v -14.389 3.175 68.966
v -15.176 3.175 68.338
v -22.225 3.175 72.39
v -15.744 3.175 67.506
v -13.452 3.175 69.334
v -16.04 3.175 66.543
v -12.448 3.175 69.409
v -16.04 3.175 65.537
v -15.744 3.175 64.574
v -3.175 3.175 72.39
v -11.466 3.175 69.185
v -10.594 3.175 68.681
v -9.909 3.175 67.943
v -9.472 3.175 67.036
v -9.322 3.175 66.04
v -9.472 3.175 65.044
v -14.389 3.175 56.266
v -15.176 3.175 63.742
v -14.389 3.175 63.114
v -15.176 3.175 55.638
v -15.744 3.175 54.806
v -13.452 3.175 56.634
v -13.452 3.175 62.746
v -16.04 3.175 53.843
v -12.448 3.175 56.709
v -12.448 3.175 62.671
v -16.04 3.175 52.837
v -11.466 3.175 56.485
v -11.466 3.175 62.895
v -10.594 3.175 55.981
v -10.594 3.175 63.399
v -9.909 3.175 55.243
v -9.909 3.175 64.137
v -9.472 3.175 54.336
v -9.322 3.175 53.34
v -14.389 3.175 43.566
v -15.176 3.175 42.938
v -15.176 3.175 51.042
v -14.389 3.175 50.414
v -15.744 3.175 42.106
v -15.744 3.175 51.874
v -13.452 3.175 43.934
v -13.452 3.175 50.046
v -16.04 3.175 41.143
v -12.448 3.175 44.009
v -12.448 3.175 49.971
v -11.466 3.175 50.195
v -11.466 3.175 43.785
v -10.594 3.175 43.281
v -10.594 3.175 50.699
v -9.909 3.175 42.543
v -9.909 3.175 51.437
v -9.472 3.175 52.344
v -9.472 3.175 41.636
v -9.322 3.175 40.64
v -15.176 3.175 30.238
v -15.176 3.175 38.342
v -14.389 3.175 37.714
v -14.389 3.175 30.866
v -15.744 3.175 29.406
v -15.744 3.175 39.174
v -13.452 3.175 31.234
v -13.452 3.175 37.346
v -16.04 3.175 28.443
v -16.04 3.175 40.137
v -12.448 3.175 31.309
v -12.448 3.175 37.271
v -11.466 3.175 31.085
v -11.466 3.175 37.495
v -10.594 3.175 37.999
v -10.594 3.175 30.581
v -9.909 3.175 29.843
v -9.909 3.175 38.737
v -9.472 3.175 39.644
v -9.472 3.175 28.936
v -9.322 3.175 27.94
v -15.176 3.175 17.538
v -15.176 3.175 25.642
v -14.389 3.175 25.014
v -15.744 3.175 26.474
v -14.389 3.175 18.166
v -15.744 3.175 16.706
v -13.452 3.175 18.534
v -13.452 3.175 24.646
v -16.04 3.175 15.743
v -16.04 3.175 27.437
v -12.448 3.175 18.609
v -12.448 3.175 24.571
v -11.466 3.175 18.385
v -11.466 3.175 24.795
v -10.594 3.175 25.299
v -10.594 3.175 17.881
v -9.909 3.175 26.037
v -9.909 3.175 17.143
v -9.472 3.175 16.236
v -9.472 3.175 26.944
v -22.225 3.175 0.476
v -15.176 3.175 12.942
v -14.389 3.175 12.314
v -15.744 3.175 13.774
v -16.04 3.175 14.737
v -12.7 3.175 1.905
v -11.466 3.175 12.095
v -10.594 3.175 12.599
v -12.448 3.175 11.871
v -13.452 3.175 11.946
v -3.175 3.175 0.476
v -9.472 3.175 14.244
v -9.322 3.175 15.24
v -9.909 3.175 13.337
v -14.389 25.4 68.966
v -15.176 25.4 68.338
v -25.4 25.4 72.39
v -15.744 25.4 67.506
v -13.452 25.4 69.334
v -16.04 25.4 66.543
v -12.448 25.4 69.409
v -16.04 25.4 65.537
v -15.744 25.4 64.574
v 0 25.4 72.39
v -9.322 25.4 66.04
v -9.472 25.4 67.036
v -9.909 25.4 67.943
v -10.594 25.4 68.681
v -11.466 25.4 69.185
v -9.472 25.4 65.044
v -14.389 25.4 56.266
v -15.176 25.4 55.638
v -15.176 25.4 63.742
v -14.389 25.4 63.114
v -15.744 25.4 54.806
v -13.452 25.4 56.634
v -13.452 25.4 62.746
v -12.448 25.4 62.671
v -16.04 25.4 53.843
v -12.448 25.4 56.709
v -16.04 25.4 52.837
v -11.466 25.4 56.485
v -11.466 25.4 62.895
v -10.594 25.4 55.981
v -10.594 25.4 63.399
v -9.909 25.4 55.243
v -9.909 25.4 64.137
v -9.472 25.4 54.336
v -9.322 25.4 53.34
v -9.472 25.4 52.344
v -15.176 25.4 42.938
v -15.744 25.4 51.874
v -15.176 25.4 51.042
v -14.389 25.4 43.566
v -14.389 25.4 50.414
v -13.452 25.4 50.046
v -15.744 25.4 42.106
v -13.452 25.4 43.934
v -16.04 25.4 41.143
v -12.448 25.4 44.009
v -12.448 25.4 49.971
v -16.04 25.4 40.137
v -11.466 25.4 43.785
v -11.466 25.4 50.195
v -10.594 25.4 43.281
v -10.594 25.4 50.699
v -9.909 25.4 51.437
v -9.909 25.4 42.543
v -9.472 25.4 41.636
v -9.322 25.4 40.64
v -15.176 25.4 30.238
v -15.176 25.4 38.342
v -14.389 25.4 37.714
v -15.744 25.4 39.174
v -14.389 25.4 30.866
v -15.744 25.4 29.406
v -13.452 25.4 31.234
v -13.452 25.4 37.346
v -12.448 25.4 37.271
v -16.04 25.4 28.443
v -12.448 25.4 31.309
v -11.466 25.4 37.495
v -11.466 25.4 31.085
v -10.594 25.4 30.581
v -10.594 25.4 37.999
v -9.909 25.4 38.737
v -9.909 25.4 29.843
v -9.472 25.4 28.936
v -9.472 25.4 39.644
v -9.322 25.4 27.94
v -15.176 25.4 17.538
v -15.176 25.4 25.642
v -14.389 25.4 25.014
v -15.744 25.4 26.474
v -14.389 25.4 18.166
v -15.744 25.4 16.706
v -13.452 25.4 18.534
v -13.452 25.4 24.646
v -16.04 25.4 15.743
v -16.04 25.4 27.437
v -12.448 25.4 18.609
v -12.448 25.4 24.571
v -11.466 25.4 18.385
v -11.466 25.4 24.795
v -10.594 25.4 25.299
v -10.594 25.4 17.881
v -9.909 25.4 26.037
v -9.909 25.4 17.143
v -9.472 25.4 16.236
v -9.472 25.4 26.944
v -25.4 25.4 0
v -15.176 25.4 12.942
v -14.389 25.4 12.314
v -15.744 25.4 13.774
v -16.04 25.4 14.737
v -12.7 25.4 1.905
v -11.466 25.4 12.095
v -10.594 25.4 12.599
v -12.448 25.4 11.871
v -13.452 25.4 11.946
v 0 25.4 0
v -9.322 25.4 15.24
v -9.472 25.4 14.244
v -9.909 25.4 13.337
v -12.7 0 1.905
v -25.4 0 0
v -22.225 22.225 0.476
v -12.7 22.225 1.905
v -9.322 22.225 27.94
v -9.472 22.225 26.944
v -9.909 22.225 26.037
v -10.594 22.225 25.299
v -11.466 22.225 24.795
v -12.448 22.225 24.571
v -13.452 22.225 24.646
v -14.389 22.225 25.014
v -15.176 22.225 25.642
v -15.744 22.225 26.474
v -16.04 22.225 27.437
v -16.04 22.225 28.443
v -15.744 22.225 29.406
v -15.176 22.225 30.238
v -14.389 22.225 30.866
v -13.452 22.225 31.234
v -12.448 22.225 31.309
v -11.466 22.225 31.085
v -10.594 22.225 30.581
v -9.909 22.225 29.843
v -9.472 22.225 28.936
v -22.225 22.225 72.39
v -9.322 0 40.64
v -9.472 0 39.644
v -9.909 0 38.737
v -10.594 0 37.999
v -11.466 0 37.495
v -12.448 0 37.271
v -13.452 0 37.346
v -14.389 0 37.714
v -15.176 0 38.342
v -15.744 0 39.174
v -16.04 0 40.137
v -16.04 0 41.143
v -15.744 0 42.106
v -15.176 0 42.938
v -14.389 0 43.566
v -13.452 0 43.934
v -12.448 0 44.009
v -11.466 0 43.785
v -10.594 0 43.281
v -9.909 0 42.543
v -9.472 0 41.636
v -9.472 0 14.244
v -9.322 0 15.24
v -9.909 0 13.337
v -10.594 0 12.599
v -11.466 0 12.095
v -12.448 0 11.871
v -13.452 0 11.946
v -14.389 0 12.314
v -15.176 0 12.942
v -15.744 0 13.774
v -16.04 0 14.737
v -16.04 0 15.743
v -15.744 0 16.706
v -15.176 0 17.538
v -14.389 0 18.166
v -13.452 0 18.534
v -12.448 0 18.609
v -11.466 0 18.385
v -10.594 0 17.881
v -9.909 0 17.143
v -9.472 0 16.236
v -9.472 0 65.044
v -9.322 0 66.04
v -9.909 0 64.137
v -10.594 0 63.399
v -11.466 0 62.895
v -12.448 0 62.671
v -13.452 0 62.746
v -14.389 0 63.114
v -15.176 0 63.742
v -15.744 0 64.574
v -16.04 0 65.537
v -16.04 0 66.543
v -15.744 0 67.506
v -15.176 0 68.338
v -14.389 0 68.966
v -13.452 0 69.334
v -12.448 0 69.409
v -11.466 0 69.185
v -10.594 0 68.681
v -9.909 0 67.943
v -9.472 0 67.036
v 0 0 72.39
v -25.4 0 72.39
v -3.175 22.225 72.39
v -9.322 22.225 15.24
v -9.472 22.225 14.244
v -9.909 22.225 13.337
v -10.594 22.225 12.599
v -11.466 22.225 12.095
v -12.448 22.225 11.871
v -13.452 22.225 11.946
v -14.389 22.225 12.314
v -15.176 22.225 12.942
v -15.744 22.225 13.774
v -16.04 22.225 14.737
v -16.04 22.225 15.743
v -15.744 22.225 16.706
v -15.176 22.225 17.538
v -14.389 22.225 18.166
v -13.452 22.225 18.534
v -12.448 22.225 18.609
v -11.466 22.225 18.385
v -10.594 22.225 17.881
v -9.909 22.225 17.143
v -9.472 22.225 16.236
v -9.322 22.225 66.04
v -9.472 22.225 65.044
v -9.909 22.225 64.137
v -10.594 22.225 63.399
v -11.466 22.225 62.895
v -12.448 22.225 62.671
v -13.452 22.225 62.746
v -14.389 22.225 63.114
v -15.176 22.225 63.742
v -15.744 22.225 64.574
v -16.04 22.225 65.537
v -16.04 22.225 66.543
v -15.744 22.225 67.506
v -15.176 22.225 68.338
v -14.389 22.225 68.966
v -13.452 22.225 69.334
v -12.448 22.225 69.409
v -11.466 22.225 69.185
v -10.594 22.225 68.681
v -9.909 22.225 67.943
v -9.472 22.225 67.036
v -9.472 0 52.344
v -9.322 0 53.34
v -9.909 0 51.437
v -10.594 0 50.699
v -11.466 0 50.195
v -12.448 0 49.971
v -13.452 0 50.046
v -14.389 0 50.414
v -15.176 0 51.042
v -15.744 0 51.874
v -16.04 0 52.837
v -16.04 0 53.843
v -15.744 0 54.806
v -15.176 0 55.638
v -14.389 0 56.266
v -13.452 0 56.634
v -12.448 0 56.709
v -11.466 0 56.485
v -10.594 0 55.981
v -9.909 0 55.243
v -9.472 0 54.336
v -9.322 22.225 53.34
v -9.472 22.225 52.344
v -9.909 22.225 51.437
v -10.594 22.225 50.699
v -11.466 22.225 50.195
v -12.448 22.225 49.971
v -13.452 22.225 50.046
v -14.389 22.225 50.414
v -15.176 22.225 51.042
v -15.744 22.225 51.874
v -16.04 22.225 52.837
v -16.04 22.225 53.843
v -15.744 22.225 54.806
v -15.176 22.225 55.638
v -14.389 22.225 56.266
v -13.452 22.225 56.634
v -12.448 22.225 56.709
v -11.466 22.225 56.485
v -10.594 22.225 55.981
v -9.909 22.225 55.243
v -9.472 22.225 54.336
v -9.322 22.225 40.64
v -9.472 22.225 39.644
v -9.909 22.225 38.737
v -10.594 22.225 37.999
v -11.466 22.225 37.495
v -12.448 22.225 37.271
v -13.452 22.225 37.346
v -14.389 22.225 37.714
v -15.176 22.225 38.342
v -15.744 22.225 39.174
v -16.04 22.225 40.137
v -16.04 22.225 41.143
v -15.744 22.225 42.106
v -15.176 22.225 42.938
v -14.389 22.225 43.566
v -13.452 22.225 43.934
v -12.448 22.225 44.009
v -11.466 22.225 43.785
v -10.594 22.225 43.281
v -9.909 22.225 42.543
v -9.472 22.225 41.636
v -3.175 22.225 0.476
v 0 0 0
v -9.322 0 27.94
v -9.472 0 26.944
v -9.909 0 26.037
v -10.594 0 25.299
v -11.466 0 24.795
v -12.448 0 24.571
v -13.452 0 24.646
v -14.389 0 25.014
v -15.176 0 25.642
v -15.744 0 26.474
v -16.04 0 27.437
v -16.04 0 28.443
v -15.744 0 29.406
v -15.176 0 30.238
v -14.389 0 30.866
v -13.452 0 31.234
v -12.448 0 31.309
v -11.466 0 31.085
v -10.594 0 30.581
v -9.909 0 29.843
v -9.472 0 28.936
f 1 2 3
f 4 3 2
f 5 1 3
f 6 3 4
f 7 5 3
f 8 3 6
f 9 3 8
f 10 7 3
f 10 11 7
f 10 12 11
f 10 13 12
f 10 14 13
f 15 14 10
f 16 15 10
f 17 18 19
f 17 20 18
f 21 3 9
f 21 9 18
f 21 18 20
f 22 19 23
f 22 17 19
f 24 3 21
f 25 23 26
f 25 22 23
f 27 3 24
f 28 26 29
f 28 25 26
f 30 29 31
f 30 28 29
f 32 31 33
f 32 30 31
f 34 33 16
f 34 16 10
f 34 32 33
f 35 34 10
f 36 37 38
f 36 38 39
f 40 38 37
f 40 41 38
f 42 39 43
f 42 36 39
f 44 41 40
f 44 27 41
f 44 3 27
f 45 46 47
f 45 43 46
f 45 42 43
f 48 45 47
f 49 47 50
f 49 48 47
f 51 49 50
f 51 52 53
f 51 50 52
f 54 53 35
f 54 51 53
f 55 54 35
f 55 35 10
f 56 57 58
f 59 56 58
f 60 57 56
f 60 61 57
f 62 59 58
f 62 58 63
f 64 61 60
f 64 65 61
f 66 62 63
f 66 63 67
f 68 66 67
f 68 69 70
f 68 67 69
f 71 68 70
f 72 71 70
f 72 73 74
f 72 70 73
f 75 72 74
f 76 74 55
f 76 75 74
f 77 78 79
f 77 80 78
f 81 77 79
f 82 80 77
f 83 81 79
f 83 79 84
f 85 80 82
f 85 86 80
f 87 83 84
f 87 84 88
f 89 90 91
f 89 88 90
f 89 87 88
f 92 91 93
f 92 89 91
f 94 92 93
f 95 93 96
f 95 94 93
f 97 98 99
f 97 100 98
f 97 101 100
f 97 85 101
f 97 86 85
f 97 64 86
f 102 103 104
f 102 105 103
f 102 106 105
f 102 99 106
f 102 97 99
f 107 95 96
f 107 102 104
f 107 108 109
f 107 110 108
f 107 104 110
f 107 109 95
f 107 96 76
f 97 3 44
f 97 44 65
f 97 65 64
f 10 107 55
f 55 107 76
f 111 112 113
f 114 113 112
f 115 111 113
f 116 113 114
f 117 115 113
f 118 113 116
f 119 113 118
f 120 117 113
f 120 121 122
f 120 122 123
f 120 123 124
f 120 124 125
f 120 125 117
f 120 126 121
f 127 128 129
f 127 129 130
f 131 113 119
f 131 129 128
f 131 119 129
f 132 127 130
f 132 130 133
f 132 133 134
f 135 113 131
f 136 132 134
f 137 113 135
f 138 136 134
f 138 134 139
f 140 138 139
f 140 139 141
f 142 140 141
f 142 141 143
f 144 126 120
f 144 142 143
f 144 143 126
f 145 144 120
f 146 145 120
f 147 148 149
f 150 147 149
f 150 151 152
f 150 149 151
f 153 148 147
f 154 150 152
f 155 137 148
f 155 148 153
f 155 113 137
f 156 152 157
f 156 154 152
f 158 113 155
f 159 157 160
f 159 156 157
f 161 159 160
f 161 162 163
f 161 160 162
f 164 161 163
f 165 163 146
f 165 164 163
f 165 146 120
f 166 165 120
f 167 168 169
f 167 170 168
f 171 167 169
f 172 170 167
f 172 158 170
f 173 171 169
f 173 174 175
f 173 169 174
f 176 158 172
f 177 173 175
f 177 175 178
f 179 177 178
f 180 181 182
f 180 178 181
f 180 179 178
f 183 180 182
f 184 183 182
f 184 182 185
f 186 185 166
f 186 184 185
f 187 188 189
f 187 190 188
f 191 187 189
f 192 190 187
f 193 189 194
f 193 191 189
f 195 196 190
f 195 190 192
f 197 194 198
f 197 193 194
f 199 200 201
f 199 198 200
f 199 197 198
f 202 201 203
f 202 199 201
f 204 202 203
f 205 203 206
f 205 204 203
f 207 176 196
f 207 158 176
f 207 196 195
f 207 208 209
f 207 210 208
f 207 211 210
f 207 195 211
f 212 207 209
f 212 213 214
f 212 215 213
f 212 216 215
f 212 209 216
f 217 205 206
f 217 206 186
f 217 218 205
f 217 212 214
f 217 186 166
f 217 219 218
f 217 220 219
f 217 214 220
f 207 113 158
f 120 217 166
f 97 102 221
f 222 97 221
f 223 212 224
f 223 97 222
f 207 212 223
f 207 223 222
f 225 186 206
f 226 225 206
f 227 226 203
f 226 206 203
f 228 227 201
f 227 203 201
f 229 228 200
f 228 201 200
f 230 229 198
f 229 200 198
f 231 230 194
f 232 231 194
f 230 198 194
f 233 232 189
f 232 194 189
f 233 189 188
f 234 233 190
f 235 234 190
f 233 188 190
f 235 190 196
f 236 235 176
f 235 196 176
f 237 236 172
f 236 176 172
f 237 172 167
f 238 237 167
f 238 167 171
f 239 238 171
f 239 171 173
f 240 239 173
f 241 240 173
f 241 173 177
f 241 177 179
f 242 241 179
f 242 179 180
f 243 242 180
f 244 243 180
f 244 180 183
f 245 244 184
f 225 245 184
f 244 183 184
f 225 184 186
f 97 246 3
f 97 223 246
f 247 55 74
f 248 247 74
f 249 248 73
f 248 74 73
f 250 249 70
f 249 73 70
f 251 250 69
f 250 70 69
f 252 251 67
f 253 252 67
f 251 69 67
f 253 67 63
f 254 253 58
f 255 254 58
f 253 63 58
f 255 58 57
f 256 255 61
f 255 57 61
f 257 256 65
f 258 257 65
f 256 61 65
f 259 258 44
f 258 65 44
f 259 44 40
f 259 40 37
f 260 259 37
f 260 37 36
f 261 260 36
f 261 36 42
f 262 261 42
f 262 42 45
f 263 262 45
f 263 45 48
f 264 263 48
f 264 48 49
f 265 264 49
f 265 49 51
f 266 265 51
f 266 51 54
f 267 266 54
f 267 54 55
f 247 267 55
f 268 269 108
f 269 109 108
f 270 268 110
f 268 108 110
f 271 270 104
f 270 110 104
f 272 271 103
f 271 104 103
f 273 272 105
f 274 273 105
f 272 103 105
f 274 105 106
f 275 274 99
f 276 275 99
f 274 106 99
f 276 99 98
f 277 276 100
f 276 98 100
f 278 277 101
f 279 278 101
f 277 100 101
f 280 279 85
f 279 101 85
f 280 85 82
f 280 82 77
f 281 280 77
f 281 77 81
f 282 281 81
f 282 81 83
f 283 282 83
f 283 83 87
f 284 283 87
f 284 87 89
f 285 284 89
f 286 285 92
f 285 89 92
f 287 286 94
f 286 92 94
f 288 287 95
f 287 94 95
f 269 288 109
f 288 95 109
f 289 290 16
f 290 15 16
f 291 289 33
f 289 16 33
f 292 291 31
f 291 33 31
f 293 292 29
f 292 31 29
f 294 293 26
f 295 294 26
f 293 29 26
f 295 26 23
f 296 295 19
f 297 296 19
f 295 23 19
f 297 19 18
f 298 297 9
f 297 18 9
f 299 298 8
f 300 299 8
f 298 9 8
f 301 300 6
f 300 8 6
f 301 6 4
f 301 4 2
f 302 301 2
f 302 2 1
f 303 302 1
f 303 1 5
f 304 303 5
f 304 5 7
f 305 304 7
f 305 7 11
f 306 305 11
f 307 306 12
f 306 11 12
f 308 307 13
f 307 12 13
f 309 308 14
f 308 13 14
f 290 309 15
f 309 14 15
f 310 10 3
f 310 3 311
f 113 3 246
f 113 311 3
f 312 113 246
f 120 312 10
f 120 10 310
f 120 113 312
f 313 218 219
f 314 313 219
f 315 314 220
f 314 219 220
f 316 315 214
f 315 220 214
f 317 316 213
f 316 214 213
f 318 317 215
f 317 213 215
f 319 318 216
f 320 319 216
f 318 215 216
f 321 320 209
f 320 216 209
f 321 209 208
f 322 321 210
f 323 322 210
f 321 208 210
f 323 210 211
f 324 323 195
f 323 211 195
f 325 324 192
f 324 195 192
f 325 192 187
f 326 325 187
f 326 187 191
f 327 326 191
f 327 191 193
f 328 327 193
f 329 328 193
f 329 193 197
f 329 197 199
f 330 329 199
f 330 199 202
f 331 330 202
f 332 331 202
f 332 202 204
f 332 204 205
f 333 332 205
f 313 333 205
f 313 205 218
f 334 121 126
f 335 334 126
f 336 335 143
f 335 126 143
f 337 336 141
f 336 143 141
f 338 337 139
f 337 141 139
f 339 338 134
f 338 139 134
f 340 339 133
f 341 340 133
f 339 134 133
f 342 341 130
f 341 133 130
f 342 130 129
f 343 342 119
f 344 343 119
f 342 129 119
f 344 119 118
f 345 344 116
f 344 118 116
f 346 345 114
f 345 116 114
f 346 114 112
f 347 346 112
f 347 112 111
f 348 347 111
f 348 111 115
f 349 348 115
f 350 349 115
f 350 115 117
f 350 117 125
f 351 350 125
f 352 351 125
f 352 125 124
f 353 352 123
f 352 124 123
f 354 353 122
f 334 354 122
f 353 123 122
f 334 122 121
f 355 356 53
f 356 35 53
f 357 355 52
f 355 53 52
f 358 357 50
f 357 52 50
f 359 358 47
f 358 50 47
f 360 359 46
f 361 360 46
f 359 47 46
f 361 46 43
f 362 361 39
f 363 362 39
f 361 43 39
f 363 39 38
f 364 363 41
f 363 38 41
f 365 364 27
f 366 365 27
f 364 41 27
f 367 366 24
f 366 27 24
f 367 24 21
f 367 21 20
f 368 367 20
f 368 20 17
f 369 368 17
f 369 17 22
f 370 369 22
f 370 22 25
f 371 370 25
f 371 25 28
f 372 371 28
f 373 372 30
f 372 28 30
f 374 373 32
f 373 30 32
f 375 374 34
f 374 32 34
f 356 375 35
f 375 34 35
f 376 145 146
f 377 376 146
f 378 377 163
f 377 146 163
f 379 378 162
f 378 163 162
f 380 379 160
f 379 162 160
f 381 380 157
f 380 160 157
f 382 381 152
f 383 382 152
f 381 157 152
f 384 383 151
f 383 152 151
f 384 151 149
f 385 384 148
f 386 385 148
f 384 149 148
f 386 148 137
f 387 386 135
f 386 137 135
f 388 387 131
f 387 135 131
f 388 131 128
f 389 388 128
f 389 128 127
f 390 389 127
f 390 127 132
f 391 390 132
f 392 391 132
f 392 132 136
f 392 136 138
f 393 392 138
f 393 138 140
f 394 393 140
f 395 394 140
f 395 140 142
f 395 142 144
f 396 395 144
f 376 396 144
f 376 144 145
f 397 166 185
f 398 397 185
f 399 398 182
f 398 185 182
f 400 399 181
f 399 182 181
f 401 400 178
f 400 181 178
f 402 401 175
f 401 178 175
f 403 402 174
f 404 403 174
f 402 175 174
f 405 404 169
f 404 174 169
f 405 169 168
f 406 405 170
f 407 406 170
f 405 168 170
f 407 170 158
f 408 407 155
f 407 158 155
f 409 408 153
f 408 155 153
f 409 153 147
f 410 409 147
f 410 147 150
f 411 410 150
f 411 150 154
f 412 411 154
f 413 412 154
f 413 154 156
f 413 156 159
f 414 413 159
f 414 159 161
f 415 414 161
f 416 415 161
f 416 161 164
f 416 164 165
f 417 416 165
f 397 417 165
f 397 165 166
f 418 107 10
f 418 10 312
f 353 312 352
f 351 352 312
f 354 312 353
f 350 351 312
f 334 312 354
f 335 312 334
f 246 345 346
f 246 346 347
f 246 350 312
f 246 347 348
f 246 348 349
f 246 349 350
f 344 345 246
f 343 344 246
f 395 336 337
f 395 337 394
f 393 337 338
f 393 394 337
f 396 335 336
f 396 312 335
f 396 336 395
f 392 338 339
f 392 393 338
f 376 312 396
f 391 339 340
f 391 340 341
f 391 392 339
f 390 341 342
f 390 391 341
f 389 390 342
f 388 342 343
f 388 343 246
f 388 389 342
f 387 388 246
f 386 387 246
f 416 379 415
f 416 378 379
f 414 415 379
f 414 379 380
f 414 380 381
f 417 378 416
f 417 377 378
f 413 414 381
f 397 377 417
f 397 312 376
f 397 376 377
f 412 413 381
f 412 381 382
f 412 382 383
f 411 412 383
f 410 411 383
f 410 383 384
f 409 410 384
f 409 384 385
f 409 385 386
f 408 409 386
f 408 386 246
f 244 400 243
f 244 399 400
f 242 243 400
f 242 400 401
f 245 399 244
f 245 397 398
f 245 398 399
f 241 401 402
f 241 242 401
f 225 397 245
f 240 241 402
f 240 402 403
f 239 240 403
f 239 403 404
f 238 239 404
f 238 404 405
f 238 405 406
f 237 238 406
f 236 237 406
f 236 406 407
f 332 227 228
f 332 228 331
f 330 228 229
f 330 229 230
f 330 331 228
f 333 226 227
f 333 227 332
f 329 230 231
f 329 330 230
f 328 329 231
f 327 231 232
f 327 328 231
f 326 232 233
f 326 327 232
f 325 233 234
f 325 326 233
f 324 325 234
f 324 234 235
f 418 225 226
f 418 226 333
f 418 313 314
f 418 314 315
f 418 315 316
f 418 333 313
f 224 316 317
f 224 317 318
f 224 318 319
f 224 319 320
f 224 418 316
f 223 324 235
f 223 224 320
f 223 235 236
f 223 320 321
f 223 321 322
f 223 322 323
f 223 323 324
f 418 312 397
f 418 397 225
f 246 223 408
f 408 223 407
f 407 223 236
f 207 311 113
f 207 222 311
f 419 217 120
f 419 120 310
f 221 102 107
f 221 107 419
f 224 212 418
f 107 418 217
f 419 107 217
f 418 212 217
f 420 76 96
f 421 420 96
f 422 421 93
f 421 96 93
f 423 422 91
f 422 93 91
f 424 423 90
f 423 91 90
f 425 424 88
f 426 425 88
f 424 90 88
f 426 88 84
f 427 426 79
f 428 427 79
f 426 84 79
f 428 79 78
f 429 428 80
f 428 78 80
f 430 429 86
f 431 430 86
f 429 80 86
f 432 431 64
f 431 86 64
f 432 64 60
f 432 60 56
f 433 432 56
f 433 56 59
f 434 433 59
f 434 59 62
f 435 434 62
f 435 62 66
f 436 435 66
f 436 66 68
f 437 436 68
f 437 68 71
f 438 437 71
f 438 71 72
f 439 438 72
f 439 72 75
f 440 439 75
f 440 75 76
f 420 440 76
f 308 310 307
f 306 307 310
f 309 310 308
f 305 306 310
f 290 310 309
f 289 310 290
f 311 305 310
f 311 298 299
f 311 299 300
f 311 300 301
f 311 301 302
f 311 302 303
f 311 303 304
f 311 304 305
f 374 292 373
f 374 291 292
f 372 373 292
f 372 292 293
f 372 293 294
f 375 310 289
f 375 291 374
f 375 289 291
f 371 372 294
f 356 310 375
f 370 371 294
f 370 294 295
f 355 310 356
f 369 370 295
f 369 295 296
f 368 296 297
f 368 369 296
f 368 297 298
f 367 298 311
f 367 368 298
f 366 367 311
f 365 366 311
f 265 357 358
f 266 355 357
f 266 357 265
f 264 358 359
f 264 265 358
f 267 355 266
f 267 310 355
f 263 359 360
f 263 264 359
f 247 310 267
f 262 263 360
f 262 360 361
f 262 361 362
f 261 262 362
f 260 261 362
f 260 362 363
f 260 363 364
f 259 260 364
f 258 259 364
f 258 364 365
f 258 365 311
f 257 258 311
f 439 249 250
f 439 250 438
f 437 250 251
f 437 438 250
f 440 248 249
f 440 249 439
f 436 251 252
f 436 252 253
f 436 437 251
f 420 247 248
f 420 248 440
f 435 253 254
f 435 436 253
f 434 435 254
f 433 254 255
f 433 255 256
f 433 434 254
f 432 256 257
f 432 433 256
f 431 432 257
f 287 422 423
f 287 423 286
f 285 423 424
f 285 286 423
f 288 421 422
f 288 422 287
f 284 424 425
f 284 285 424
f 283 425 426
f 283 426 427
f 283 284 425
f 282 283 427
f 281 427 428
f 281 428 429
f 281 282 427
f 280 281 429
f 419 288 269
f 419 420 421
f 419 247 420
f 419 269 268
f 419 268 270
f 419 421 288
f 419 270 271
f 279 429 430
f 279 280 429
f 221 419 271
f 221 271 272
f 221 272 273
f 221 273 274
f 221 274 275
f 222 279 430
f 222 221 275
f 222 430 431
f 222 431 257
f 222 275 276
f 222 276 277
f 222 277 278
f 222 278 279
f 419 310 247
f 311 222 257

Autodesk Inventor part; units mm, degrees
ref_plane "YZ Plane" through (0, 0, 0) normal (1, 0, 0) x (0, 1, 0)
ref_plane "XZ Plane" through (0, 0, 0) normal (0, 1, 0) x (-1, 0, 0)
ref_plane "XY Plane" through (0, 0, 0) normal (0, 0, 1) x (1, 0, 0)
sketch "Sketch1" plane through (0, 0, 0) normal (0, 0, 1) x (1, 0, 0)
  line L0 (0, 0) -> (-25.4, 0)
  line L1 (-25.4, 0) -> (-25.4, 25.4)
  line L2 (-25.4, 25.4) -> (0, 25.4)
  line L3 (0, 25.4) -> (0, 0)
  line L4 (-3.175, 22.225) -> (-22.225, 22.225)
  line L5 (-22.225, 22.225) -> (-22.225, 3.175)
  line L6 (-22.225, 3.175) -> (-3.175, 3.175)
  line L7 (-3.175, 3.175) -> (-3.175, 22.225)
  dimension "d2" = 25.4
  dimension "d4" = 25.4
  dimension "d5" = 3.175
extrude "Extrusion1" add sketch "Sketch1" along normal blind 72.39
sketch "Sketch2" plane through (-25.4, 25.4, 0) normal (0, 1, 0) x (1, 0, 0)
  line L0 (0, 0) -> (25.4, 0) projected
  line L1 (0, 0) -> (0, -72.39) projected
  line L2 (0, 0) -> (0, -1.905)
  line L3 (12.7, 0) -> (12.7, -1.905)
  line L4 (12.7, -1.905) -> (0, 0)
  line L5 (12.7, -1.905) -> (25.4, 0)
  dimension "d8" = 1.905
  dimension "d9" = 1.905
extrude "Extrusion2" cut sketch "Sketch2" against normal blind 25.4
sketch "Sketch3" plane through (-25.4, 25.4, 72.39) normal (0, 1, 0) x (1, 0, 0)
  line L0 (25.4, 0) -> (0, 0) projected
  line L1 (25.4, 72.39) -> (25.4, 0) projected
  line L2 (12.7, 0) -> (12.7, 70.485) construction
  line L3 (12.7, 0) -> (12.7, 6.35)
  circle A0 centre (12.7, 6.35) radius 3.3782
  circle A1 centre (12.7, 19.05) radius 3.3782
  circle A2 centre (12.7, 31.75) radius 3.3782
  circle A3 centre (12.7, 44.45) radius 3.3782
  circle A4 centre (12.7, 57.15) radius 3.3782
  dimension "d12" = 6.35
  dimension "d13" = 6.7564
  dimension "d16" = 12.7
extrude "Extrusion3" cut sketch "Sketch3" against normal blind 25.4
properties part number "V mount" material "Aluminum 6061"
